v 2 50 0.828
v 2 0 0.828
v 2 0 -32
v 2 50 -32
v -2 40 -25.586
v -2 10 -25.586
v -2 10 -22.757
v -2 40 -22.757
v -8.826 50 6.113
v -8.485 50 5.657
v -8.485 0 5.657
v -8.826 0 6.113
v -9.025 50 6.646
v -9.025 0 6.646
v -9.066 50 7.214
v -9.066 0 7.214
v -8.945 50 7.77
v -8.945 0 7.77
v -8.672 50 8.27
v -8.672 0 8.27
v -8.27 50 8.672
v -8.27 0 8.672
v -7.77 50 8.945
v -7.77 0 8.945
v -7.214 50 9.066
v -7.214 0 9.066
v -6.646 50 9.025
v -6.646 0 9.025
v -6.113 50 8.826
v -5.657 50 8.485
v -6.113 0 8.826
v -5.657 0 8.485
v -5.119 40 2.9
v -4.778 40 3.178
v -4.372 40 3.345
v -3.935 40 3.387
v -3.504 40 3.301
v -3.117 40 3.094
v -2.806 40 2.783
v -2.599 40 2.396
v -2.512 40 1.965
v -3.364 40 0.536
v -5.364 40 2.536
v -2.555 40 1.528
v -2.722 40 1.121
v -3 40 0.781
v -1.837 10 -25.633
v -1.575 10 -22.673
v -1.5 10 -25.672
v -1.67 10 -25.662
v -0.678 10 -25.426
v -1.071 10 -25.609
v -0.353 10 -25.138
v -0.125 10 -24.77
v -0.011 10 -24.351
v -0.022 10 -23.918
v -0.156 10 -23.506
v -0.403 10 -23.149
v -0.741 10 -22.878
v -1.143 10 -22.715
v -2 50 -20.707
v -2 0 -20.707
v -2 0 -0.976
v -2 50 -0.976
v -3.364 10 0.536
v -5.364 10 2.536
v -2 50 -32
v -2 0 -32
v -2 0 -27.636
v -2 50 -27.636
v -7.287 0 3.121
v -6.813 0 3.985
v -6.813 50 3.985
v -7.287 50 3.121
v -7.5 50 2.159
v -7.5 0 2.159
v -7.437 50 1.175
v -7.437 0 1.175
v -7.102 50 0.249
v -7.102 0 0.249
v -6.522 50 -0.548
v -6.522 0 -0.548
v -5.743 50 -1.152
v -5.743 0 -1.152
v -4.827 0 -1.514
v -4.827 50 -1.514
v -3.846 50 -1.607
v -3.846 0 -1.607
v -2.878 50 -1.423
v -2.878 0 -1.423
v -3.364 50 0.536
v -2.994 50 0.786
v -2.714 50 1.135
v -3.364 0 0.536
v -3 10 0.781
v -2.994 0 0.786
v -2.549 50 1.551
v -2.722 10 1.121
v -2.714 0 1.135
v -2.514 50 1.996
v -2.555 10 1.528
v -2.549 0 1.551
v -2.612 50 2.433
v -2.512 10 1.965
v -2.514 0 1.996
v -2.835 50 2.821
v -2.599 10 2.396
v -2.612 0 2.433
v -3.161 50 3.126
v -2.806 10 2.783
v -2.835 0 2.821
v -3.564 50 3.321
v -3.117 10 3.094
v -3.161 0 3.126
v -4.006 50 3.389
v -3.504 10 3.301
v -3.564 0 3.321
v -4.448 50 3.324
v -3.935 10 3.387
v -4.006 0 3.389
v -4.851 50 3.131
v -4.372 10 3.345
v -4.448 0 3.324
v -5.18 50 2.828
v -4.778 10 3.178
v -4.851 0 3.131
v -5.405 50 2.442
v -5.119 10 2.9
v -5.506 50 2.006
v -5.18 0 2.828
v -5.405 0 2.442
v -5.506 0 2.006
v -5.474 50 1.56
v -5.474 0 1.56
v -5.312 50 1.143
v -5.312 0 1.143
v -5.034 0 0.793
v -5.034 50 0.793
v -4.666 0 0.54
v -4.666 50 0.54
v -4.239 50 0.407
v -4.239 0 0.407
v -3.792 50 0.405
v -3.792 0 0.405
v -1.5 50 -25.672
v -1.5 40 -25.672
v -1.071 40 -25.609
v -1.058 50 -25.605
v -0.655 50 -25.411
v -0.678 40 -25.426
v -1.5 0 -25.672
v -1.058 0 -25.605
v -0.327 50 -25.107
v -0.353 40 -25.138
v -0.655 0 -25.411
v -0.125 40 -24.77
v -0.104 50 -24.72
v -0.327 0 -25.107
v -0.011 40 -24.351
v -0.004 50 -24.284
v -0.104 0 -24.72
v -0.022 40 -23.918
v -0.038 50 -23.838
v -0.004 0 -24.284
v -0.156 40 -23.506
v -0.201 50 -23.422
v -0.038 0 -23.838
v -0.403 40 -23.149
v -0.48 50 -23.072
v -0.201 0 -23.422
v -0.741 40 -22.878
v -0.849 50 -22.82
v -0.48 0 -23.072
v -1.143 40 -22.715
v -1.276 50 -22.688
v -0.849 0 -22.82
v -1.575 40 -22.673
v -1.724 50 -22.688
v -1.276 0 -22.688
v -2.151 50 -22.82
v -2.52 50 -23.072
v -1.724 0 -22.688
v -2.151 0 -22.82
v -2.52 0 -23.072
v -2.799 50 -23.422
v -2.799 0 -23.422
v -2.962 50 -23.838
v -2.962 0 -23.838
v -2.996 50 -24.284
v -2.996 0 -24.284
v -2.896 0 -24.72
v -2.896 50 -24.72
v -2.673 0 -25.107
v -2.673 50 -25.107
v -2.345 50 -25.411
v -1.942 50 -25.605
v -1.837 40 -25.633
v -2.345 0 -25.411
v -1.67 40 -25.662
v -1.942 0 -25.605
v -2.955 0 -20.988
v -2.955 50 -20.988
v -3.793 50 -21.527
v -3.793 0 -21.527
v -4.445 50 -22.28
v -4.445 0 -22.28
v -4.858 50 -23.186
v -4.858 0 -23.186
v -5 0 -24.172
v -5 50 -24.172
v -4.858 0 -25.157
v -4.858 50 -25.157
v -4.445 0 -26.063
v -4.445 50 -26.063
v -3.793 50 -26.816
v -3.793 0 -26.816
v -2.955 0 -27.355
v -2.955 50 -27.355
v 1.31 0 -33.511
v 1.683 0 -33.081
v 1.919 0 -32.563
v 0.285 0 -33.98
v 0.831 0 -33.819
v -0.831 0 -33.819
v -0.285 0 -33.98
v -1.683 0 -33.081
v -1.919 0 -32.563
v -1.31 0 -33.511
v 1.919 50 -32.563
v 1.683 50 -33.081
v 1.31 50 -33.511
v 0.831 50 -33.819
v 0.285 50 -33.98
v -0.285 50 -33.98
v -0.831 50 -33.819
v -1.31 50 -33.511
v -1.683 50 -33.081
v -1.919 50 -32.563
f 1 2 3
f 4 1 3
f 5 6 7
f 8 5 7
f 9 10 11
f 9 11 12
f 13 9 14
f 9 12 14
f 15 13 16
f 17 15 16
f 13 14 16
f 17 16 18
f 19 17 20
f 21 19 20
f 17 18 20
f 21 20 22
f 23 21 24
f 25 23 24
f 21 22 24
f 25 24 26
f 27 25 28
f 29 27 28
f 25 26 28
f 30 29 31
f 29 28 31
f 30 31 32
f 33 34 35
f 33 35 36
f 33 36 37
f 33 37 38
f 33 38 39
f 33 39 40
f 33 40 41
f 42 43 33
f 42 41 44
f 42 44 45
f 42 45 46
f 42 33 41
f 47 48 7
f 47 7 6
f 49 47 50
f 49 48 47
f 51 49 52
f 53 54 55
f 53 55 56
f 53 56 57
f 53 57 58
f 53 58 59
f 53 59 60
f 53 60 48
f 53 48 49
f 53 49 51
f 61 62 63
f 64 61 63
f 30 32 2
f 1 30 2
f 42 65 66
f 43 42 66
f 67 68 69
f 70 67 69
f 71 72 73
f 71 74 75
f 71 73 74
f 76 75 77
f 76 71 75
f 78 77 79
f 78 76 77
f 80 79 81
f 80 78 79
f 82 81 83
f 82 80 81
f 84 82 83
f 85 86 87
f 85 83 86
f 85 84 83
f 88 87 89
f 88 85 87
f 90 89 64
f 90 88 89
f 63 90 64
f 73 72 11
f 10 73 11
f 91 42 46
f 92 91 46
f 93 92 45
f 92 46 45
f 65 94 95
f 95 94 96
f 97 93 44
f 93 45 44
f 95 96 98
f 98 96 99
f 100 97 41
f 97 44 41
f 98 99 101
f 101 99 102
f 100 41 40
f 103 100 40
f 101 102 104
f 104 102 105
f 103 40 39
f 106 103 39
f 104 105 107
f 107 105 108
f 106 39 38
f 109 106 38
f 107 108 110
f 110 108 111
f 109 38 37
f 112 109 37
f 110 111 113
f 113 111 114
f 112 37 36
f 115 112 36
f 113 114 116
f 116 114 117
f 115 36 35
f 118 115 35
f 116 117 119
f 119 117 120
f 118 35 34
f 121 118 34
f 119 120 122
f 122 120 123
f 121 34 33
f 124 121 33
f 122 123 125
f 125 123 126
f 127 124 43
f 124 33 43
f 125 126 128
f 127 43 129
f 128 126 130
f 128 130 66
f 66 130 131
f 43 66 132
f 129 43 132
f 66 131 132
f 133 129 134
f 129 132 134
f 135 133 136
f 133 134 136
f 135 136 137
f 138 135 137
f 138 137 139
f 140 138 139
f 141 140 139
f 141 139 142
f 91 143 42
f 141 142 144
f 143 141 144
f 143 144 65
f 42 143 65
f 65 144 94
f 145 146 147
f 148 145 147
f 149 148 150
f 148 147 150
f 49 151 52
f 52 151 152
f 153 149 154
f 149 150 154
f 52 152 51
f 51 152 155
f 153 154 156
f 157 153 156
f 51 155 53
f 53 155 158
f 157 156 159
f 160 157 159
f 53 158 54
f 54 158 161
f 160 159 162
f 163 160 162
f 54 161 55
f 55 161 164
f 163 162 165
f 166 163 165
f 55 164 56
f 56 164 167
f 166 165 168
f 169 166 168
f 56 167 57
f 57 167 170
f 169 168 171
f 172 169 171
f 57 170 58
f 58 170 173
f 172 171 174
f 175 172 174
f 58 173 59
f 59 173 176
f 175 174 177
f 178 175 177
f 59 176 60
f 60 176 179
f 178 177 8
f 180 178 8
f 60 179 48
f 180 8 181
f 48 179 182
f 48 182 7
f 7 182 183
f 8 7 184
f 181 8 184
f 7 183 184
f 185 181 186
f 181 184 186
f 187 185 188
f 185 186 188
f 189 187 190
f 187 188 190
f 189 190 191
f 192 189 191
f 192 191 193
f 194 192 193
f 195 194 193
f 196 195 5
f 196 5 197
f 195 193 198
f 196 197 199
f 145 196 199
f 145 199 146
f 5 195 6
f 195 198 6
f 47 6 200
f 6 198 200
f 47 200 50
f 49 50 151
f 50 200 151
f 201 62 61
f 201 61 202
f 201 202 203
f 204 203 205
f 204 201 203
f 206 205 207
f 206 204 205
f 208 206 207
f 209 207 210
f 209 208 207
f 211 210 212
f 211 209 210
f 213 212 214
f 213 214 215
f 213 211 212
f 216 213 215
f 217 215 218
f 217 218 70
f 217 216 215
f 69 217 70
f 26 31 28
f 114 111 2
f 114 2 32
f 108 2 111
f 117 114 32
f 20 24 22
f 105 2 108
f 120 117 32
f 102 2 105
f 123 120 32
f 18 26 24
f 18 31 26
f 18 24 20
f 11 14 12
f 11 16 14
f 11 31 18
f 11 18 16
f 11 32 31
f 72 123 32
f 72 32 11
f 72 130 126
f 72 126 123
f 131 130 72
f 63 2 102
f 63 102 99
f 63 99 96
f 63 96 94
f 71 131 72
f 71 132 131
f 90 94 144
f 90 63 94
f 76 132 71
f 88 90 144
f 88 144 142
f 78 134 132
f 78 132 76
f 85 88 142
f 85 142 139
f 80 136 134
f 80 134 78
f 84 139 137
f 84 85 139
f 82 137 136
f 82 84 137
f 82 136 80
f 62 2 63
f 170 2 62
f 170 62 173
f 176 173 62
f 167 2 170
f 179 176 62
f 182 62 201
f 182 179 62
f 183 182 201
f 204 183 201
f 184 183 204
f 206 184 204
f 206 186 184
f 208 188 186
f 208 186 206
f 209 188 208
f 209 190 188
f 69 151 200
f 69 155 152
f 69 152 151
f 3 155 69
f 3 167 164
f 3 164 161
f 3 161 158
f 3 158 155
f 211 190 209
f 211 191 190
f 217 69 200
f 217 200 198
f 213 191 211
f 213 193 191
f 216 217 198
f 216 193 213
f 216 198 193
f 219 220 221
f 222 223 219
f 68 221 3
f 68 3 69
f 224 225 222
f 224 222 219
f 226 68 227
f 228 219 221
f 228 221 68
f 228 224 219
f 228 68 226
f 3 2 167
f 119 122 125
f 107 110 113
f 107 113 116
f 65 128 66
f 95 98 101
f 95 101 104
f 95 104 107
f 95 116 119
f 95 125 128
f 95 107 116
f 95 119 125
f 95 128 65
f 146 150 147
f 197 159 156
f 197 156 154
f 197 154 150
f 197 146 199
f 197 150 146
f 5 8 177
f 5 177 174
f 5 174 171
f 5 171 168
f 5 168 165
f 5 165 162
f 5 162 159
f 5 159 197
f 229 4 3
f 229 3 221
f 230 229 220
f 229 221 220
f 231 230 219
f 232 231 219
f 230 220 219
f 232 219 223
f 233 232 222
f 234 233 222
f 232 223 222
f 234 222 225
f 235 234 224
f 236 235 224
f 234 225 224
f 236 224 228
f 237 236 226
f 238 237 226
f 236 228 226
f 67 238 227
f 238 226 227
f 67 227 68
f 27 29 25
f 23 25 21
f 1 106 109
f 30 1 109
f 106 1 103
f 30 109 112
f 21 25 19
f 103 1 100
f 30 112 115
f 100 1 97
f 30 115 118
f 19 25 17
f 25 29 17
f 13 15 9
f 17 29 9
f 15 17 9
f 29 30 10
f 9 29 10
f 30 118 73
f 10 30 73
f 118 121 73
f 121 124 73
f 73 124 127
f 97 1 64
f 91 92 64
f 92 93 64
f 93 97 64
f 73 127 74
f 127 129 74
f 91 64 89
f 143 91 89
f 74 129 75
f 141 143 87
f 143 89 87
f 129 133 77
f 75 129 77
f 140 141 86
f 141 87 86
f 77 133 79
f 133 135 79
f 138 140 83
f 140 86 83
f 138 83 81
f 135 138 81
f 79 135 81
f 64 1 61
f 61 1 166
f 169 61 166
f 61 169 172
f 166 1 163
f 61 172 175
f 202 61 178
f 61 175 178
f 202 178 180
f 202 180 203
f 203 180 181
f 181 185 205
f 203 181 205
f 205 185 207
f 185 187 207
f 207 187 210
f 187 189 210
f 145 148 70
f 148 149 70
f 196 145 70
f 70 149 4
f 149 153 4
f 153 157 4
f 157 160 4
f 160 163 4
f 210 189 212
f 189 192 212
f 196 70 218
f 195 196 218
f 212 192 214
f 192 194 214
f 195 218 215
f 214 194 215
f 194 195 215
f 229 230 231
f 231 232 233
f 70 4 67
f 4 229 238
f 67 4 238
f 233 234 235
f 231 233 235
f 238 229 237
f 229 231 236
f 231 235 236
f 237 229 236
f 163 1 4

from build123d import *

# Parameters (mm, degrees)
BOSS_EXTRUDE1_DEPTH = 50
SKETCH5_R           = 3.5
SKETCH5_R_2         = 1.5
BOSS_EXTRUDE2_DEPTH = 50
SKETCH6_R           = 1.5
CUT_EXTRUDE1_DEPTH  = 10
CUT_EXTRUDE2_START  = -10
SKETCH7_R           = 1.5
CUT_EXTRUDE2_DEPTH  = 10


with BuildPart() as part:
    # Sketch1 → Boss-Extrude1 (new body)
    with BuildSketch(Plane(origin=(0, 0, 0), x_dir=(1, 0, 0), z_dir=(0, 1, 0))):
        with BuildLine():
            Line((-2, 32), (-2, 0.828427125))
            Line((-2, 0.828427125), (-8.485281374, -5.656854249))
            ThreePointArc((-8.485281374, -5.656854249), (-8.485281374, -8.485281374), (-5.656854249, -8.485281374))
            Line((-5.656854249, -8.485281374), (2, -0.828427125))
            Line((2, -0.828427125), (2, 32))
            ThreePointArc((2, 32), (0, 34), (-2, 32))
        make_face()
    extrude(amount=BOSS_EXTRUDE1_DEPTH)

    # Sketch5 → Boss-Extrude2 (add, through all)
    # profile 1 of 2: a face of its own
    with BuildSketch(Plane(origin=(0, 0, 0), x_dir=(-1, 0, 0), z_dir=(0, -1, 0))):
        with Locations((1.5, 24.171572875)):
            Circle(SKETCH5_R)
        with Locations((1.5, 24.171572875)):
            Circle(SKETCH5_R_2, mode=Mode.SUBTRACT)
    # profile 2 of 2: a face of its own
    with BuildSketch(Plane(origin=(0, 0, 0), x_dir=(-1, 0, 0), z_dir=(0, -1, 0))):
        with Locations((4.01040764, -1.889087297)):
            Circle(SKETCH5_R)
        with Locations((4.01040764, -1.889087297)):
            Circle(SKETCH5_R_2, mode=Mode.SUBTRACT)
    extrude(amount=-BOSS_EXTRUDE2_DEPTH)

    # Sketch6 → Cut-Extrude1 (cut)
    with BuildSketch(Plane(origin=(0, 0, 0), x_dir=(-1, 0, 0), z_dir=(0, -1, 0))):
        with Locations(Location((4.01040764, -1.889087297, 0), (0, 0, 90))):
            Circle(SKETCH6_R)
        with Locations(Location((1.5, 24.171572875, 0), (0, 0, 90))):
            Circle(SKETCH6_R)
    extrude(amount=-CUT_EXTRUDE1_DEPTH, mode=Mode.SUBTRACT)

    # Sketch7 → Cut-Extrude2 (cut)
    with BuildSketch(Plane(origin=(0, 50, 0), x_dir=(1, 0, 0), z_dir=(0, 1, 0)).offset(CUT_EXTRUDE2_START)):
        with Locations(Location((-4.01040764, -1.889087297, 0), (0, 0, 90))):
            Circle(SKETCH7_R)
        with Locations(Location((-1.5, 24.171572875, 0), (0, 0, 90))):
            Circle(SKETCH7_R)
    extrude(amount=CUT_EXTRUDE2_DEPTH, mode=Mode.SUBTRACT)


solid = part.part
